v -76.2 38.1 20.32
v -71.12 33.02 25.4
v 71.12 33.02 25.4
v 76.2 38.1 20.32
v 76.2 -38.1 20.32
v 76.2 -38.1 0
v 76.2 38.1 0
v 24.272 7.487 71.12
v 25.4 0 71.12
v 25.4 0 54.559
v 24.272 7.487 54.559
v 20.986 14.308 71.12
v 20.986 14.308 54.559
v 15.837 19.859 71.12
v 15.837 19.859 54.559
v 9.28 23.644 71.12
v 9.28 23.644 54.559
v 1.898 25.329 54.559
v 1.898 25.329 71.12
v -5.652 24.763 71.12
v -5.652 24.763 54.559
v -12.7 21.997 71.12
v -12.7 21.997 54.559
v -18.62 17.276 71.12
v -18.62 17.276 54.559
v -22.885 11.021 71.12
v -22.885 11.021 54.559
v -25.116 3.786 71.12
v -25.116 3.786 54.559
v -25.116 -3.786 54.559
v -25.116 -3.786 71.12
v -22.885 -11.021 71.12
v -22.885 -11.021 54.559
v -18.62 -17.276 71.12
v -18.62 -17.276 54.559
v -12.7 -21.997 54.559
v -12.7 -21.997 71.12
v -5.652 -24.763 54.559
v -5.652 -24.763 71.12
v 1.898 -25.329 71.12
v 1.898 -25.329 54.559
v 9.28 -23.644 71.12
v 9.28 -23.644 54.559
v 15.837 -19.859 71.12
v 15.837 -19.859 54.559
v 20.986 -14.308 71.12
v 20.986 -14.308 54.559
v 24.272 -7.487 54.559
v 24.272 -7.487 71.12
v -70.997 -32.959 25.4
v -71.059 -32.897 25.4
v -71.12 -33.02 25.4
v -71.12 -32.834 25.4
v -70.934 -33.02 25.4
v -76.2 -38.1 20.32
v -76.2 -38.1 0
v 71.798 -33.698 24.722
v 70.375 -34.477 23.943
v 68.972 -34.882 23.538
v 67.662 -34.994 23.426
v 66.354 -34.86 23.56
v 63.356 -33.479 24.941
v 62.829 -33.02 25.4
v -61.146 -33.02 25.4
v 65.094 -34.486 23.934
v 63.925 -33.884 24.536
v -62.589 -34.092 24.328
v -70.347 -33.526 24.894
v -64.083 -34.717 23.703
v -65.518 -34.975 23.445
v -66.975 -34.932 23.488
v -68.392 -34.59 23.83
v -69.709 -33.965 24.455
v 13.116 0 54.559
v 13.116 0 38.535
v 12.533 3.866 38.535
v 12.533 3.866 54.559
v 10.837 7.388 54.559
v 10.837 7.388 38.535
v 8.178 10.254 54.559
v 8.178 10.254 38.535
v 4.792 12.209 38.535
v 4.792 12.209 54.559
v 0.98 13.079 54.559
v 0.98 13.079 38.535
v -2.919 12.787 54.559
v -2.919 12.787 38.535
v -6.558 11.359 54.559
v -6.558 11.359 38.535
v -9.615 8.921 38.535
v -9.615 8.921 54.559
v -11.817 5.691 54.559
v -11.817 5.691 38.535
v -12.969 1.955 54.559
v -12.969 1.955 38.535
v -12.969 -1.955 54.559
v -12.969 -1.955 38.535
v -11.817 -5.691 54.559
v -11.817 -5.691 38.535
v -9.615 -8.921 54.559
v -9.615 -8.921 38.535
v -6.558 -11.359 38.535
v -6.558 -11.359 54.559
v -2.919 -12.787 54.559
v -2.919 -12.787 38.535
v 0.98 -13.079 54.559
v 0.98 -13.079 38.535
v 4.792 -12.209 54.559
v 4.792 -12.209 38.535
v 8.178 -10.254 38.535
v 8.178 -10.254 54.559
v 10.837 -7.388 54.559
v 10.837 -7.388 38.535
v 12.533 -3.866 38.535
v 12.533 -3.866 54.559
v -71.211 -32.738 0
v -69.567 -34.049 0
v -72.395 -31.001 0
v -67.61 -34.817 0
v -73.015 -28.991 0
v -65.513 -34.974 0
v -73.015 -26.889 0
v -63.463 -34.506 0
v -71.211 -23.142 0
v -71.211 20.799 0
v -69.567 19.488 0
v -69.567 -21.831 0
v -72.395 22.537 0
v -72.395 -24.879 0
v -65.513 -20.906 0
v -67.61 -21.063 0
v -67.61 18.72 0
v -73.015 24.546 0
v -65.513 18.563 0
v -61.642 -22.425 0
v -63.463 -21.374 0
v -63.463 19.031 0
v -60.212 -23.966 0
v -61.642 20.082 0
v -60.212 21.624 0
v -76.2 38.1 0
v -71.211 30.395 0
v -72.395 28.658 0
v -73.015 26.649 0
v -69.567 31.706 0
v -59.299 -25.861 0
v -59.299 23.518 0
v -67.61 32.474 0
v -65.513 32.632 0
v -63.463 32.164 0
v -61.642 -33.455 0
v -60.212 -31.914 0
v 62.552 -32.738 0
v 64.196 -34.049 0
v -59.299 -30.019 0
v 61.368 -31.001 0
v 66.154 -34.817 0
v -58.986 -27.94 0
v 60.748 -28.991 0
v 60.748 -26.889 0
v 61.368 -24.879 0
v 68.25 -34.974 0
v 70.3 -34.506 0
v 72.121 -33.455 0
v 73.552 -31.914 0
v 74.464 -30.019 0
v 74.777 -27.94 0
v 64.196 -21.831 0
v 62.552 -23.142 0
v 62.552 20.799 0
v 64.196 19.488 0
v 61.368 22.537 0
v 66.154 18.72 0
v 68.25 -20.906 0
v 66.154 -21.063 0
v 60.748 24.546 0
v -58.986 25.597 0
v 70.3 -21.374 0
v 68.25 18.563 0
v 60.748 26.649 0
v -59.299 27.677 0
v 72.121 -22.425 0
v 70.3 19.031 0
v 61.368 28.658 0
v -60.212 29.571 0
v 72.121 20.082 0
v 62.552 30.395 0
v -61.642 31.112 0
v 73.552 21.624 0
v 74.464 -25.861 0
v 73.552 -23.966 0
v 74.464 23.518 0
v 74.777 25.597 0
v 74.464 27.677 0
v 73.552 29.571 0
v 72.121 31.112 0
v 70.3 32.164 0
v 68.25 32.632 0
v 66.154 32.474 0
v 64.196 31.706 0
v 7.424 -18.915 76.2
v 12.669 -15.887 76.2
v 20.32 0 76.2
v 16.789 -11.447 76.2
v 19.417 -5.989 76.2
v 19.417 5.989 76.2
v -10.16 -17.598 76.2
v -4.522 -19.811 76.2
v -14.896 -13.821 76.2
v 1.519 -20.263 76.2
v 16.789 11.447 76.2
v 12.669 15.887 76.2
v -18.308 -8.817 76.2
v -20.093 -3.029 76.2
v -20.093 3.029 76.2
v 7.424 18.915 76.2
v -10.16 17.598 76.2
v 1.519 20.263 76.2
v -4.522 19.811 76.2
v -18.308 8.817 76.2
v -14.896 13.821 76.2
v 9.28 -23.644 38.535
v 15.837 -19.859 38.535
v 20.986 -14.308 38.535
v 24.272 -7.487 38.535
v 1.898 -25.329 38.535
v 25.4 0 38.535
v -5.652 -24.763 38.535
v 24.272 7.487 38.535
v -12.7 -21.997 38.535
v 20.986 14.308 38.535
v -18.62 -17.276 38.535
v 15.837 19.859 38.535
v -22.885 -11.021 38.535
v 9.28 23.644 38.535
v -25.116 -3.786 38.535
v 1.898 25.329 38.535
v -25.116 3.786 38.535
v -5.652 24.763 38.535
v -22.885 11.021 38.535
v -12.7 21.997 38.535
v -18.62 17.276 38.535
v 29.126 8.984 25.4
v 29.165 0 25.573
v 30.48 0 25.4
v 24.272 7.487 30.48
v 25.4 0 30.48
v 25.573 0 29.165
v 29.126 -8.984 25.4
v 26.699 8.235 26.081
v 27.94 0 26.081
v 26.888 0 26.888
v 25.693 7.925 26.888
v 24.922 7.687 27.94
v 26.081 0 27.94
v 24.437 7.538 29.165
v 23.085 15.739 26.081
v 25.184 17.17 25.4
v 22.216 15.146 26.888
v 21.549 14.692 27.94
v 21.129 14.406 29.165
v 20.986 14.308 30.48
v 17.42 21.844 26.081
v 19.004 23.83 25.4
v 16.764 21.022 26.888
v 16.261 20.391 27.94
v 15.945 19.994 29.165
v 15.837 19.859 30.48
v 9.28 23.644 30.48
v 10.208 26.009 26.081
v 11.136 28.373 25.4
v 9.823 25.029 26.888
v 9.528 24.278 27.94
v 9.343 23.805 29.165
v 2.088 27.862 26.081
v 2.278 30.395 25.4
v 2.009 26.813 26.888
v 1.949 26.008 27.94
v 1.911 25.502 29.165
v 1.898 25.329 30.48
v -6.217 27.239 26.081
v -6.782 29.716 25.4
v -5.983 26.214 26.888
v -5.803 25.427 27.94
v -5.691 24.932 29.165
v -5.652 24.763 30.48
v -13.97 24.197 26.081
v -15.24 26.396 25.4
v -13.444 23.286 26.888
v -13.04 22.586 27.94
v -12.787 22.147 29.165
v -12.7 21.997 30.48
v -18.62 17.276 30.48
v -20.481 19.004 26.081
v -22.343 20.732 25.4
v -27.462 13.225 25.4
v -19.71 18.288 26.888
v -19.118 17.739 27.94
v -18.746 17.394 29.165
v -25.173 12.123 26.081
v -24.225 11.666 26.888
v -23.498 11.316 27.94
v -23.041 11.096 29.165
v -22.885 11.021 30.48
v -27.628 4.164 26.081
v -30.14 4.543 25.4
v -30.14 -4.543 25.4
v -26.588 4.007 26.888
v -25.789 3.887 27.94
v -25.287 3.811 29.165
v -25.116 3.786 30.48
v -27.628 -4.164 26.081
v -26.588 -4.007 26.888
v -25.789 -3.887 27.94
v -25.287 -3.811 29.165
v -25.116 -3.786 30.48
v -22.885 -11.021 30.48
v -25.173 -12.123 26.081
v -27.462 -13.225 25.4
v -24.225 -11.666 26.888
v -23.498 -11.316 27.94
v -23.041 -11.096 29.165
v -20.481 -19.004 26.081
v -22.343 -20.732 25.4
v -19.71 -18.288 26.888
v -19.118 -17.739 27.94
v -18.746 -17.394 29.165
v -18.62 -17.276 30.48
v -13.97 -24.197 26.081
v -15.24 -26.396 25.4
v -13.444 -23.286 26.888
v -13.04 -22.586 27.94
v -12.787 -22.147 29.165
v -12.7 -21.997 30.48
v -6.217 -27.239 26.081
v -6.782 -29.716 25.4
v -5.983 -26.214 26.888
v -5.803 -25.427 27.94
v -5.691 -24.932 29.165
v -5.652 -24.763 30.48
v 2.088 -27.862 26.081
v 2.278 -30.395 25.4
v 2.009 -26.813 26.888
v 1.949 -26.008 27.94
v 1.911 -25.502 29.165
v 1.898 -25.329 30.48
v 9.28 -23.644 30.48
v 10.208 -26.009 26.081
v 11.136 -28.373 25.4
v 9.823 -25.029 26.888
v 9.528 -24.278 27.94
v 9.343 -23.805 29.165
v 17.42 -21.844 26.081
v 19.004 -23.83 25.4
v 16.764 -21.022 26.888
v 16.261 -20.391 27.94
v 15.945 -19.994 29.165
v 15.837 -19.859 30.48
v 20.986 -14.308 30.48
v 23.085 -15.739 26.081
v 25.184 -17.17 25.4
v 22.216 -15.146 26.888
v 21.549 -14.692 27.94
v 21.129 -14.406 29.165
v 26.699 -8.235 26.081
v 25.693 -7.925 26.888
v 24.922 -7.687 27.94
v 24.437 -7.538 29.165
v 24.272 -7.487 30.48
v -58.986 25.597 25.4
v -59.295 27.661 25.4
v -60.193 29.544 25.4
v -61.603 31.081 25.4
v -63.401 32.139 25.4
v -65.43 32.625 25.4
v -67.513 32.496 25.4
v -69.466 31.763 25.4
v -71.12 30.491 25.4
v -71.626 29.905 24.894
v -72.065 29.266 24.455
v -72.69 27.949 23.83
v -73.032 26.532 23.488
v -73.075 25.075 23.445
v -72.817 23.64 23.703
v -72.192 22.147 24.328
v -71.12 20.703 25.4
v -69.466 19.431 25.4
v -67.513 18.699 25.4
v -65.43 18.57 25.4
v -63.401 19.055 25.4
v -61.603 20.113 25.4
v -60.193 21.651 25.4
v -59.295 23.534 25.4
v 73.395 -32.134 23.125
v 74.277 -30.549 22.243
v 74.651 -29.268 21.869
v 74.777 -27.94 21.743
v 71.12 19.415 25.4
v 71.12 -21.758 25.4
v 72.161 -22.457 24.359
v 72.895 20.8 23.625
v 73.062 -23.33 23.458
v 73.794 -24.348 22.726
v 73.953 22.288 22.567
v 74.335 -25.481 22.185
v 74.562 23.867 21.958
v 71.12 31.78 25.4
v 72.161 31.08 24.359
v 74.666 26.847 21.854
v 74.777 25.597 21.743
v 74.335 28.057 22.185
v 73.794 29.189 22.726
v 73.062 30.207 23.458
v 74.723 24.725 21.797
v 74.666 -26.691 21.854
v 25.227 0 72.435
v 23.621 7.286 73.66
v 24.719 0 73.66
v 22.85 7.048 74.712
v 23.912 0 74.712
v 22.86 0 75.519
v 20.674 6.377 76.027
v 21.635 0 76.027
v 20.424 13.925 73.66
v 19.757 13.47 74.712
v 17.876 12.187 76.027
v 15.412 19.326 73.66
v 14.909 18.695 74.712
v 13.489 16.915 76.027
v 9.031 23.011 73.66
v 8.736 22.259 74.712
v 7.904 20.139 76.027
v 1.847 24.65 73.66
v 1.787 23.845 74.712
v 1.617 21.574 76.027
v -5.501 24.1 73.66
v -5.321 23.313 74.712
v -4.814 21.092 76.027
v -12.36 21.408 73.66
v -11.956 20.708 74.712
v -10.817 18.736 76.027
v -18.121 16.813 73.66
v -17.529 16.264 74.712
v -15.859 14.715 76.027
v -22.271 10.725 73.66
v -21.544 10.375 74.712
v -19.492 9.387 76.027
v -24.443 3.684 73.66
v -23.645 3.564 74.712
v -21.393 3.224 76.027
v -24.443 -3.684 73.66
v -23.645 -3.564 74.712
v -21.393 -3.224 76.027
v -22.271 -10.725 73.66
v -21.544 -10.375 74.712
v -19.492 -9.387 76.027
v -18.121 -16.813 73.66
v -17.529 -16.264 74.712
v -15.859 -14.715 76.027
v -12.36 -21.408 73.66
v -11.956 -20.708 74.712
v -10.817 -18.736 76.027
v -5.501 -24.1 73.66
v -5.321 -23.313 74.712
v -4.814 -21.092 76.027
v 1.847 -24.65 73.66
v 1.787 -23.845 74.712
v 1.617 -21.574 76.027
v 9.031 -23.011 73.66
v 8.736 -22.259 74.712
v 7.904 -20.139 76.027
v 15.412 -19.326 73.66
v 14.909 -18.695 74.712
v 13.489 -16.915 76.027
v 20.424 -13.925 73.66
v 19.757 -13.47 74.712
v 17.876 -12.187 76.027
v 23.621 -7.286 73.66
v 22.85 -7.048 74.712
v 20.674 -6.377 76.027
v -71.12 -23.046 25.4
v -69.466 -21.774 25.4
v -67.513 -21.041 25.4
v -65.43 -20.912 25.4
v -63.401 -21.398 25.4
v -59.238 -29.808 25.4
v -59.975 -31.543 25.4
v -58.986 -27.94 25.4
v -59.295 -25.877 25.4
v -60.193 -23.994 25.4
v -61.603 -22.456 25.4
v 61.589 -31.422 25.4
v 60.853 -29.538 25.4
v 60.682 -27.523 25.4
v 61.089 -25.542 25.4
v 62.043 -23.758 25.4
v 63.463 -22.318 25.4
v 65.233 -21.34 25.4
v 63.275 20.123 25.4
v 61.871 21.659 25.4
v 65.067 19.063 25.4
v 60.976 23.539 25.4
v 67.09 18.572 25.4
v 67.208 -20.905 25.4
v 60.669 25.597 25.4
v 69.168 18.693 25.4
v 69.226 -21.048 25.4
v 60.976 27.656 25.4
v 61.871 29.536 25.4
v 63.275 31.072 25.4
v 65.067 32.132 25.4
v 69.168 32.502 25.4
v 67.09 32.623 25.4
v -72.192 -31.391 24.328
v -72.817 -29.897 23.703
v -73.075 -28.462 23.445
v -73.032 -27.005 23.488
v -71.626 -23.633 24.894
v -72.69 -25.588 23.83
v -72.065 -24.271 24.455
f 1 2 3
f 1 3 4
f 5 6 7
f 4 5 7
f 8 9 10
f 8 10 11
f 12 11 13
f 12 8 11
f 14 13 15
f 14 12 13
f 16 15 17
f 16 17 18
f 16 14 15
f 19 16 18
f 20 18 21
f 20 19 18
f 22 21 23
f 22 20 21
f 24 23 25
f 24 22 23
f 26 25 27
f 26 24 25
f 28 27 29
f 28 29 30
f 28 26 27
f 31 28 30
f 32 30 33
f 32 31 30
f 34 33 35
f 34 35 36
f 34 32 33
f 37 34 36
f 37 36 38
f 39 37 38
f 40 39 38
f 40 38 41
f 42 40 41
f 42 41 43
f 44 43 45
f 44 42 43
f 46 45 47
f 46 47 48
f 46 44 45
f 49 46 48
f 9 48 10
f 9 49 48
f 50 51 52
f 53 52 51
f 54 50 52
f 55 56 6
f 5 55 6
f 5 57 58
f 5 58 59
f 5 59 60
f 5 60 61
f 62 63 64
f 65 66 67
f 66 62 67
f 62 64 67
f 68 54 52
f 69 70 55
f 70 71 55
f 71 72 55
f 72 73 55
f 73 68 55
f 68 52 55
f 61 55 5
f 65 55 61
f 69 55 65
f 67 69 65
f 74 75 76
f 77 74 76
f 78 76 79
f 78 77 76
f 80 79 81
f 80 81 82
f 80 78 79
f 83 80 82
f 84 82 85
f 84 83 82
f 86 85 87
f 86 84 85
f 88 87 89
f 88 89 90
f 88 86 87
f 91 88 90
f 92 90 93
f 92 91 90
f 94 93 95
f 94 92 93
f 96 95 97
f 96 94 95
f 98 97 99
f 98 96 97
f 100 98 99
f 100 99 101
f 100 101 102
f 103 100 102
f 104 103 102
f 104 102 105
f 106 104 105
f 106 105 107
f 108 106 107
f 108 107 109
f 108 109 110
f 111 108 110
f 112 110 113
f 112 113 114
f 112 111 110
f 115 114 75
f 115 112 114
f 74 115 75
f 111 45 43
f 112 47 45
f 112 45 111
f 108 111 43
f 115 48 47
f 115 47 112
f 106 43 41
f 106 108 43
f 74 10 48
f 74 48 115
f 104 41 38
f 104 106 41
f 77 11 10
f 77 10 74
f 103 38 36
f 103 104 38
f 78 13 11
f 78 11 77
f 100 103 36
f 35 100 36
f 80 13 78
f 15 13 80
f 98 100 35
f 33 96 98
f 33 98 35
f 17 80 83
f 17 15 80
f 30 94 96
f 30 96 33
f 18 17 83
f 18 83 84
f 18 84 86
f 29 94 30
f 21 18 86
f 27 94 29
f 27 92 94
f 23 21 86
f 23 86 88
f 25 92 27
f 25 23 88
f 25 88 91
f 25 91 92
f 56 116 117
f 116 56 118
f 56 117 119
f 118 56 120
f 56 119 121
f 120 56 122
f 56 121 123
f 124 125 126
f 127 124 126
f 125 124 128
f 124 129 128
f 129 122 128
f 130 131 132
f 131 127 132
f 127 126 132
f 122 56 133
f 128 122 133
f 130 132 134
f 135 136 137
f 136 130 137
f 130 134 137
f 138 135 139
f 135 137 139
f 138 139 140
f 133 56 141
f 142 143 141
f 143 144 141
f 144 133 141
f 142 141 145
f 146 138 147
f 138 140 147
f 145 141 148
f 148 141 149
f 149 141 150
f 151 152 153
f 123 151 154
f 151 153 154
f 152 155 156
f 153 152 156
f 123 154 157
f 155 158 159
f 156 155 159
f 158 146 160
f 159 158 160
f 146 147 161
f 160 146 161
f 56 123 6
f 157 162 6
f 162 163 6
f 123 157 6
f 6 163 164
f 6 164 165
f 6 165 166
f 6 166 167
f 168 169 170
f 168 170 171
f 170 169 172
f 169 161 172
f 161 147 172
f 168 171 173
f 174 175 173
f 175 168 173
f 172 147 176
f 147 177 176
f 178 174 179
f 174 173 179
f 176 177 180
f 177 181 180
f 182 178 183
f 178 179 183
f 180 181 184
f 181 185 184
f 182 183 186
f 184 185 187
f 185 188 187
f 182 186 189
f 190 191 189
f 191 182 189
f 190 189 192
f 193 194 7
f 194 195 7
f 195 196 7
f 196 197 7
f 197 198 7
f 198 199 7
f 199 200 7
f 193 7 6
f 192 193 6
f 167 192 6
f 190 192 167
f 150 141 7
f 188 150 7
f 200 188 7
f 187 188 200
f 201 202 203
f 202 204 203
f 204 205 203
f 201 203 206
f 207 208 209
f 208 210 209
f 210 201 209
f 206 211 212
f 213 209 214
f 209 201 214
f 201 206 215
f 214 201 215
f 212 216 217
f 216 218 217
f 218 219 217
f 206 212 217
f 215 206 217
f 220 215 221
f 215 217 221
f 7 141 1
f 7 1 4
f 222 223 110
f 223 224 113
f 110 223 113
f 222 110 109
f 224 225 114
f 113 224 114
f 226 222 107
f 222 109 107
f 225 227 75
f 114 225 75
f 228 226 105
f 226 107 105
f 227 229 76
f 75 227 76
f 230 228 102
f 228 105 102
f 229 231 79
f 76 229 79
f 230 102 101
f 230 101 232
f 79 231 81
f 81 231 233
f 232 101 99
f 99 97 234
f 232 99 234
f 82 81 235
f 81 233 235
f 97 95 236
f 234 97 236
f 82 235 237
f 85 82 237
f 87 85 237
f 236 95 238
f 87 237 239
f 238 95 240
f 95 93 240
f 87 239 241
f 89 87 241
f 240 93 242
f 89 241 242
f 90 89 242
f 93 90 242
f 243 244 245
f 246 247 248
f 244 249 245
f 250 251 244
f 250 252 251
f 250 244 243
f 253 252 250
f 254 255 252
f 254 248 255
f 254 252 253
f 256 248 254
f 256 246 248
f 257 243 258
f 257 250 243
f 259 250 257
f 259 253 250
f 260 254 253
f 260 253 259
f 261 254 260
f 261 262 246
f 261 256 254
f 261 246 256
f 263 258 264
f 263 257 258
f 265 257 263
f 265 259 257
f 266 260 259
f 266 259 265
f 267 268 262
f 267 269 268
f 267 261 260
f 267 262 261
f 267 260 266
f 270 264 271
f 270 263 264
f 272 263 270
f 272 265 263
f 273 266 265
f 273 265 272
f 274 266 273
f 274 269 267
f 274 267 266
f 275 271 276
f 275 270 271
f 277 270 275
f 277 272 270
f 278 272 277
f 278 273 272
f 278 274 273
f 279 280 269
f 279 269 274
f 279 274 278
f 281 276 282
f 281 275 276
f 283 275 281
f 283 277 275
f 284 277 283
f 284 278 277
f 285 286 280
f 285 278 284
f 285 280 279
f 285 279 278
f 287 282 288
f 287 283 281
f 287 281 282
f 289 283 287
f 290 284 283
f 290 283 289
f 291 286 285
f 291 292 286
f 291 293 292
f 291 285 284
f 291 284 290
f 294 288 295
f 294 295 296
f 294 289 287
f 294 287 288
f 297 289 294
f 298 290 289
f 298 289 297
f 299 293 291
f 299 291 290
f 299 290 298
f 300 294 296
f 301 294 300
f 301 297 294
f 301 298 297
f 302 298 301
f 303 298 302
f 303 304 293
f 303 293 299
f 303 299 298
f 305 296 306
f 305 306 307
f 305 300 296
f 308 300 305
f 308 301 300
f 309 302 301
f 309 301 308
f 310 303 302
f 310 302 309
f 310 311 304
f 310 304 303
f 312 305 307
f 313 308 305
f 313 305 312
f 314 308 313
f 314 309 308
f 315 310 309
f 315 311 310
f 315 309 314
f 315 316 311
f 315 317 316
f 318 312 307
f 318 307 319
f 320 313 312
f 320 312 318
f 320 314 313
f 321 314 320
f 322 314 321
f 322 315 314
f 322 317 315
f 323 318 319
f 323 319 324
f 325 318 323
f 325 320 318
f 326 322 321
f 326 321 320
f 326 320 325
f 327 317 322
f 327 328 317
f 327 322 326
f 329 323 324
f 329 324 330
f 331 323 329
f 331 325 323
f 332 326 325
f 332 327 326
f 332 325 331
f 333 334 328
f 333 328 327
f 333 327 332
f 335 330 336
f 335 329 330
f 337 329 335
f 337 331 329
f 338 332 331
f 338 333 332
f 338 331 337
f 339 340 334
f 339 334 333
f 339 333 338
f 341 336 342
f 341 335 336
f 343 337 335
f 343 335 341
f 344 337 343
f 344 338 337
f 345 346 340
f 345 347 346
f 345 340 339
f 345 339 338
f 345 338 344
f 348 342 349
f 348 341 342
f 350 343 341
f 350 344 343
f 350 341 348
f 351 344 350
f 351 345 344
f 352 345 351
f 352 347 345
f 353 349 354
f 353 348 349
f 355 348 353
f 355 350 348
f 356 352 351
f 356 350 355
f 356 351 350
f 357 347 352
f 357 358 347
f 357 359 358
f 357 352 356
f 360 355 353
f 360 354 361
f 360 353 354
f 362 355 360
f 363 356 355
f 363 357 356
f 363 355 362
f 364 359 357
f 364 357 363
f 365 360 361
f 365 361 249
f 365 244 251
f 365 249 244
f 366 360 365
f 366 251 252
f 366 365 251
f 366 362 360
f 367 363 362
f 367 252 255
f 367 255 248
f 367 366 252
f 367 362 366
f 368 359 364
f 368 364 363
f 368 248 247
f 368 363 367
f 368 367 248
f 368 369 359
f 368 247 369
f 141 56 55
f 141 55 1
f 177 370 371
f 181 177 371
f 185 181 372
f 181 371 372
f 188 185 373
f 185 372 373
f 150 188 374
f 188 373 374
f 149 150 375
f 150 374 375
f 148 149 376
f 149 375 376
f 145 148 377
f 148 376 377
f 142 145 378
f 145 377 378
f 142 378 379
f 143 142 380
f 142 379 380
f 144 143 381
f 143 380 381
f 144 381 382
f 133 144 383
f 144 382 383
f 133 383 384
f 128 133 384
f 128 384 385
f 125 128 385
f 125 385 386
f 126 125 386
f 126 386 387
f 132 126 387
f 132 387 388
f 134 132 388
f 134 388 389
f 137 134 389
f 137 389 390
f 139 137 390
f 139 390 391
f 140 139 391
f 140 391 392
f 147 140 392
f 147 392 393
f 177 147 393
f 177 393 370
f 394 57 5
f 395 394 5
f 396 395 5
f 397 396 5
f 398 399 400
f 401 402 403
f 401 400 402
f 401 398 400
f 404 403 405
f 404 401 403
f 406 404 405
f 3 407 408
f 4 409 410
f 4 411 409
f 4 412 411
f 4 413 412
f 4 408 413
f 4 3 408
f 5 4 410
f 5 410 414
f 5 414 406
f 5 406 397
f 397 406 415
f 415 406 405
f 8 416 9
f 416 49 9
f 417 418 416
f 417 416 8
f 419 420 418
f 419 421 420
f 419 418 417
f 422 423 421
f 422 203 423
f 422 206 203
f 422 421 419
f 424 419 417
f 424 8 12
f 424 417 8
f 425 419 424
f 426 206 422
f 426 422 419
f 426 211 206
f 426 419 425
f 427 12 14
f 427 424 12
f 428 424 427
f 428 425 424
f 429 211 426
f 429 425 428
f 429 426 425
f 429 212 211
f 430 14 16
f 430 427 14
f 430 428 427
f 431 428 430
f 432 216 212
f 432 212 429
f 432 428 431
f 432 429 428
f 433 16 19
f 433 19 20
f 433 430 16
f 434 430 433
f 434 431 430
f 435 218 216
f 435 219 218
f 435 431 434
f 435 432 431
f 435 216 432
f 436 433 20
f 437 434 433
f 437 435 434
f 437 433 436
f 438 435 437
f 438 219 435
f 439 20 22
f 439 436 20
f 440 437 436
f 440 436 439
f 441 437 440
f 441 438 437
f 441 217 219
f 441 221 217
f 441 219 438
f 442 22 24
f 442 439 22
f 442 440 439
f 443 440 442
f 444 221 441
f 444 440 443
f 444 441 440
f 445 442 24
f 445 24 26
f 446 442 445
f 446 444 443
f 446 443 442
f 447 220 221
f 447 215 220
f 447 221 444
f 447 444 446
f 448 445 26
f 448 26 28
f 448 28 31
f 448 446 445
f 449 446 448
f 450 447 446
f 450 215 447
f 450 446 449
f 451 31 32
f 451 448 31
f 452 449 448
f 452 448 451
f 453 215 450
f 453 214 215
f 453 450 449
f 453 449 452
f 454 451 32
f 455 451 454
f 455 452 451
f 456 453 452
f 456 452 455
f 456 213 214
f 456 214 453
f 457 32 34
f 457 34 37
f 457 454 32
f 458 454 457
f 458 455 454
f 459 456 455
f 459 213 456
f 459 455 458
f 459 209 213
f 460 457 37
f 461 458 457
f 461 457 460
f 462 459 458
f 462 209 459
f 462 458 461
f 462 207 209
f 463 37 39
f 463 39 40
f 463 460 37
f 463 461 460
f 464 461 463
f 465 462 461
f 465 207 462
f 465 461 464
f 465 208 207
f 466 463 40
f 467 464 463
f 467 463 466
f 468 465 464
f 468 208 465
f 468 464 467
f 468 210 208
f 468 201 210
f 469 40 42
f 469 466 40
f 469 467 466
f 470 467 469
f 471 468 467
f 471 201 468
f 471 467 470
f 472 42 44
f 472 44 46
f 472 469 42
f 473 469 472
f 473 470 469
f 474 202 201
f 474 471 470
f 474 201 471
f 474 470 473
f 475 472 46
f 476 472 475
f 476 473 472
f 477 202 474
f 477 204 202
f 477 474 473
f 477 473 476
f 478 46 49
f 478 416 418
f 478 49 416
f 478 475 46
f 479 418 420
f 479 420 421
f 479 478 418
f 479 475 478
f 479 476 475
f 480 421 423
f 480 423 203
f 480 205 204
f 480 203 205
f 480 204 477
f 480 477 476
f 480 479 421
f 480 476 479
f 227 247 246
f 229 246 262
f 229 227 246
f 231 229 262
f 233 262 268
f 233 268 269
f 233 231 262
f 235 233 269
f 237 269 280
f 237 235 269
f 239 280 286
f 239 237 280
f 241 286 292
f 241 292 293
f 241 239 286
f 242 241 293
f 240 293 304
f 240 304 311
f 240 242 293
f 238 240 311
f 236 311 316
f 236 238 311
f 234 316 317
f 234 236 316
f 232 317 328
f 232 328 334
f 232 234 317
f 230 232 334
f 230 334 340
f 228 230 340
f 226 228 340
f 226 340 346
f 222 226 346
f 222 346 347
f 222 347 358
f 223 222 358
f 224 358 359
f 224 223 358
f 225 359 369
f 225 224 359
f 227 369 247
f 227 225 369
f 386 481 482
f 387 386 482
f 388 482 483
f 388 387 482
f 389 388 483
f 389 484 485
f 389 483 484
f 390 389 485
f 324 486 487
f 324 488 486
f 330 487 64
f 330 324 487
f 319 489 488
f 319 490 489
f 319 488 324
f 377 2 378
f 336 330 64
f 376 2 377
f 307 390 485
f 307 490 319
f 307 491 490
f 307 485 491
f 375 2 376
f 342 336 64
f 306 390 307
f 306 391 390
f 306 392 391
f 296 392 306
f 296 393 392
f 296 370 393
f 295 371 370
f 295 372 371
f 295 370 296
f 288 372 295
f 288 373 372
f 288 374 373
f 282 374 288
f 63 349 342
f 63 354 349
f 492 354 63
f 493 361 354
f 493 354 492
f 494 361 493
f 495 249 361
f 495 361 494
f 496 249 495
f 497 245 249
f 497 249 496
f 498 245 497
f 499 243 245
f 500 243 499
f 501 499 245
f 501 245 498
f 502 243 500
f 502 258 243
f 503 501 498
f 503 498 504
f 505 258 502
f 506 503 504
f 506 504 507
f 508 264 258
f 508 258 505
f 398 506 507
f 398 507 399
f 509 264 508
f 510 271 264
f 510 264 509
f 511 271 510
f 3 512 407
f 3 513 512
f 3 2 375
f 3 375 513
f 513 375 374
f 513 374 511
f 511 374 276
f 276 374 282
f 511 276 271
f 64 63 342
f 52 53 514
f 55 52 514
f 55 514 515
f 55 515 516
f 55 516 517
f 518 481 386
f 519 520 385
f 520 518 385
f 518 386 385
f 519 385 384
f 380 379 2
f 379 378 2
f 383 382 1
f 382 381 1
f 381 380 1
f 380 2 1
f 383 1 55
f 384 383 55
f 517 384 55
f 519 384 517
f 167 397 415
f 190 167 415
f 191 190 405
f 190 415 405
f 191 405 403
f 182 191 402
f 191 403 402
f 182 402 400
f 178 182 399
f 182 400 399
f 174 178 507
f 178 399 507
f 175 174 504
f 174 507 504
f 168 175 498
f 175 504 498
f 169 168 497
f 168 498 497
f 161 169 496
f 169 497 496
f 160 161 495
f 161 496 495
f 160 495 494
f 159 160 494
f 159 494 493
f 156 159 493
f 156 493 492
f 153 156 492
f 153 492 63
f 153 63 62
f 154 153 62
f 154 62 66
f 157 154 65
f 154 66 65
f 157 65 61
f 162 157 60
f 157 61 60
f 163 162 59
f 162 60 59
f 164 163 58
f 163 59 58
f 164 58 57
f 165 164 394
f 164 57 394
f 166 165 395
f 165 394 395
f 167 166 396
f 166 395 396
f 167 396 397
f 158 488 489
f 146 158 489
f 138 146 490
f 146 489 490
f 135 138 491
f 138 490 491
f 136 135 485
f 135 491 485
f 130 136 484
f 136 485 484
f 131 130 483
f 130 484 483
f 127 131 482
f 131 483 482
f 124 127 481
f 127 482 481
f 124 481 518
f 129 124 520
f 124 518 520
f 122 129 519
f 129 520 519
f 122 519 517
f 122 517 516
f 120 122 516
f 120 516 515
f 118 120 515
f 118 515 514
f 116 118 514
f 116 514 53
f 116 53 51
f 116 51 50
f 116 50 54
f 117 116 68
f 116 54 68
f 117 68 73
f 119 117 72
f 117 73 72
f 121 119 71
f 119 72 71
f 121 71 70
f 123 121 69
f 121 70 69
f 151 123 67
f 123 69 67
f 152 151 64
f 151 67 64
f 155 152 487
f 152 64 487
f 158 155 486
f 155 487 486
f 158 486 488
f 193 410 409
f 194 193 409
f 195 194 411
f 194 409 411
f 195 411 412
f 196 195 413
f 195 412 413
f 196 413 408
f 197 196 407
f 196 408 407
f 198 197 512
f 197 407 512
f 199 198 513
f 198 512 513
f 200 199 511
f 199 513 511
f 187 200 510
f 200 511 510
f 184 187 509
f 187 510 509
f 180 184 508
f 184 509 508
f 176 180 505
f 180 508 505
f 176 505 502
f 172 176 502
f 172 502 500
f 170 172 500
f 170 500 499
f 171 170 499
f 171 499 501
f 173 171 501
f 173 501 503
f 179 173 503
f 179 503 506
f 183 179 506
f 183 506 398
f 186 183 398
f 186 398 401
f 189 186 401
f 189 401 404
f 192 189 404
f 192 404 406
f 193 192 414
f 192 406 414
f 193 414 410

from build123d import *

# Parameters (mm, degrees)
F0_W         = 152.4
F0_H         = 76.2
F1_DEPTH     = 25.4
F2_R         = 7.0539826123
F3_DEPTH     = 25.401
F4_W         = 25.4
F4_H         = 50.8
F6_W         = 18.2314971462
F6_H         = 16.024235636
F9_R         = 5.08
F10_T1_DEPTH = 178.5282991577
F10_T3_DEPTH = 102.3282991577


# Not quite as in the source:
# - a fillet or chamfer that OpenCascade refuses, or shapes differently, is made with other operations: its cross-section is extruded or revolved along the edge and cut away or added


with BuildPart() as f1:
    # F0 (on Top) → F1 (new body)
    with BuildSketch(Plane.XY):
        Rectangle(F0_W, F0_H)
    extrude(amount=F1_DEPTH)

    # F2 (on face) → F3 (cut, through all)
    with BuildSketch(Plane.XY.offset(25.4)):
        with Locations((67.723274231, 25.5973488092)):
            Circle(F2_R)
        with Locations((-66.04, 25.5973488092)):
            Circle(F2_R)
        with Locations((-66.04, -27.94)):
            Circle(F2_R)
        with Locations((67.723274231, -27.94)):
            Circle(F2_R)
    extrude(amount=-F3_DEPTH, mode=Mode.SUBTRACT)

    # F4 (on Front) → F5 (revolve)
    with BuildSketch(Plane.XZ):
        with Locations((12.7, 50.8)):
            Rectangle(F4_W, F4_H)
    revolve(axis=Axis((0, 0, 50.8), (0, 0, 1)))

    # F6 (on Front) → F8 (revolve, cut)
    with BuildSketch(Plane.XZ):
        with Locations((22.2315485589, 46.5468037874)):
            Rectangle(F6_W, F6_H)
    revolve(axis=Axis((0, 0, 32.2526581585), (0, 0, 1)), mode=Mode.SUBTRACT)

    # F9
    f9_edges = [f1.edges().sort_by_distance(p)[0] for p in [
        (-25.4, 0, 76.2),
        (-25.4, 0, 25.4),
    ]]
    fillet(f9_edges, radius=F9_R)

    # F10: chamfer of 5.08 on 4 edges, made by hand

    # F10_s2 → F10_t1 (cut)
    with BuildSketch(Plane.YZ.offset(-89.2641495789)):
        Polygon((-33.02, 25.4), (-38.1, 20.32), (-38.1, 25.4), align=None)
        Polygon((33.02, 25.4), (38.1, 20.32), (38.1, 25.4), align=None)
    extrude(amount=F10_T1_DEPTH, mode=Mode.SUBTRACT)

    # F10_s4 → F10_t3 (cut)
    with BuildSketch(Plane.XZ.offset(-51.1641495789)):
        Polygon((71.12, 25.4), (76.2, 20.32), (76.2, 25.4), align=None)
        Polygon((-71.12, 25.4), (-76.2, 20.32), (-76.2, 25.4), align=None)
    extrude(amount=F10_T3_DEPTH, mode=Mode.SUBTRACT)


solid = f1.part
